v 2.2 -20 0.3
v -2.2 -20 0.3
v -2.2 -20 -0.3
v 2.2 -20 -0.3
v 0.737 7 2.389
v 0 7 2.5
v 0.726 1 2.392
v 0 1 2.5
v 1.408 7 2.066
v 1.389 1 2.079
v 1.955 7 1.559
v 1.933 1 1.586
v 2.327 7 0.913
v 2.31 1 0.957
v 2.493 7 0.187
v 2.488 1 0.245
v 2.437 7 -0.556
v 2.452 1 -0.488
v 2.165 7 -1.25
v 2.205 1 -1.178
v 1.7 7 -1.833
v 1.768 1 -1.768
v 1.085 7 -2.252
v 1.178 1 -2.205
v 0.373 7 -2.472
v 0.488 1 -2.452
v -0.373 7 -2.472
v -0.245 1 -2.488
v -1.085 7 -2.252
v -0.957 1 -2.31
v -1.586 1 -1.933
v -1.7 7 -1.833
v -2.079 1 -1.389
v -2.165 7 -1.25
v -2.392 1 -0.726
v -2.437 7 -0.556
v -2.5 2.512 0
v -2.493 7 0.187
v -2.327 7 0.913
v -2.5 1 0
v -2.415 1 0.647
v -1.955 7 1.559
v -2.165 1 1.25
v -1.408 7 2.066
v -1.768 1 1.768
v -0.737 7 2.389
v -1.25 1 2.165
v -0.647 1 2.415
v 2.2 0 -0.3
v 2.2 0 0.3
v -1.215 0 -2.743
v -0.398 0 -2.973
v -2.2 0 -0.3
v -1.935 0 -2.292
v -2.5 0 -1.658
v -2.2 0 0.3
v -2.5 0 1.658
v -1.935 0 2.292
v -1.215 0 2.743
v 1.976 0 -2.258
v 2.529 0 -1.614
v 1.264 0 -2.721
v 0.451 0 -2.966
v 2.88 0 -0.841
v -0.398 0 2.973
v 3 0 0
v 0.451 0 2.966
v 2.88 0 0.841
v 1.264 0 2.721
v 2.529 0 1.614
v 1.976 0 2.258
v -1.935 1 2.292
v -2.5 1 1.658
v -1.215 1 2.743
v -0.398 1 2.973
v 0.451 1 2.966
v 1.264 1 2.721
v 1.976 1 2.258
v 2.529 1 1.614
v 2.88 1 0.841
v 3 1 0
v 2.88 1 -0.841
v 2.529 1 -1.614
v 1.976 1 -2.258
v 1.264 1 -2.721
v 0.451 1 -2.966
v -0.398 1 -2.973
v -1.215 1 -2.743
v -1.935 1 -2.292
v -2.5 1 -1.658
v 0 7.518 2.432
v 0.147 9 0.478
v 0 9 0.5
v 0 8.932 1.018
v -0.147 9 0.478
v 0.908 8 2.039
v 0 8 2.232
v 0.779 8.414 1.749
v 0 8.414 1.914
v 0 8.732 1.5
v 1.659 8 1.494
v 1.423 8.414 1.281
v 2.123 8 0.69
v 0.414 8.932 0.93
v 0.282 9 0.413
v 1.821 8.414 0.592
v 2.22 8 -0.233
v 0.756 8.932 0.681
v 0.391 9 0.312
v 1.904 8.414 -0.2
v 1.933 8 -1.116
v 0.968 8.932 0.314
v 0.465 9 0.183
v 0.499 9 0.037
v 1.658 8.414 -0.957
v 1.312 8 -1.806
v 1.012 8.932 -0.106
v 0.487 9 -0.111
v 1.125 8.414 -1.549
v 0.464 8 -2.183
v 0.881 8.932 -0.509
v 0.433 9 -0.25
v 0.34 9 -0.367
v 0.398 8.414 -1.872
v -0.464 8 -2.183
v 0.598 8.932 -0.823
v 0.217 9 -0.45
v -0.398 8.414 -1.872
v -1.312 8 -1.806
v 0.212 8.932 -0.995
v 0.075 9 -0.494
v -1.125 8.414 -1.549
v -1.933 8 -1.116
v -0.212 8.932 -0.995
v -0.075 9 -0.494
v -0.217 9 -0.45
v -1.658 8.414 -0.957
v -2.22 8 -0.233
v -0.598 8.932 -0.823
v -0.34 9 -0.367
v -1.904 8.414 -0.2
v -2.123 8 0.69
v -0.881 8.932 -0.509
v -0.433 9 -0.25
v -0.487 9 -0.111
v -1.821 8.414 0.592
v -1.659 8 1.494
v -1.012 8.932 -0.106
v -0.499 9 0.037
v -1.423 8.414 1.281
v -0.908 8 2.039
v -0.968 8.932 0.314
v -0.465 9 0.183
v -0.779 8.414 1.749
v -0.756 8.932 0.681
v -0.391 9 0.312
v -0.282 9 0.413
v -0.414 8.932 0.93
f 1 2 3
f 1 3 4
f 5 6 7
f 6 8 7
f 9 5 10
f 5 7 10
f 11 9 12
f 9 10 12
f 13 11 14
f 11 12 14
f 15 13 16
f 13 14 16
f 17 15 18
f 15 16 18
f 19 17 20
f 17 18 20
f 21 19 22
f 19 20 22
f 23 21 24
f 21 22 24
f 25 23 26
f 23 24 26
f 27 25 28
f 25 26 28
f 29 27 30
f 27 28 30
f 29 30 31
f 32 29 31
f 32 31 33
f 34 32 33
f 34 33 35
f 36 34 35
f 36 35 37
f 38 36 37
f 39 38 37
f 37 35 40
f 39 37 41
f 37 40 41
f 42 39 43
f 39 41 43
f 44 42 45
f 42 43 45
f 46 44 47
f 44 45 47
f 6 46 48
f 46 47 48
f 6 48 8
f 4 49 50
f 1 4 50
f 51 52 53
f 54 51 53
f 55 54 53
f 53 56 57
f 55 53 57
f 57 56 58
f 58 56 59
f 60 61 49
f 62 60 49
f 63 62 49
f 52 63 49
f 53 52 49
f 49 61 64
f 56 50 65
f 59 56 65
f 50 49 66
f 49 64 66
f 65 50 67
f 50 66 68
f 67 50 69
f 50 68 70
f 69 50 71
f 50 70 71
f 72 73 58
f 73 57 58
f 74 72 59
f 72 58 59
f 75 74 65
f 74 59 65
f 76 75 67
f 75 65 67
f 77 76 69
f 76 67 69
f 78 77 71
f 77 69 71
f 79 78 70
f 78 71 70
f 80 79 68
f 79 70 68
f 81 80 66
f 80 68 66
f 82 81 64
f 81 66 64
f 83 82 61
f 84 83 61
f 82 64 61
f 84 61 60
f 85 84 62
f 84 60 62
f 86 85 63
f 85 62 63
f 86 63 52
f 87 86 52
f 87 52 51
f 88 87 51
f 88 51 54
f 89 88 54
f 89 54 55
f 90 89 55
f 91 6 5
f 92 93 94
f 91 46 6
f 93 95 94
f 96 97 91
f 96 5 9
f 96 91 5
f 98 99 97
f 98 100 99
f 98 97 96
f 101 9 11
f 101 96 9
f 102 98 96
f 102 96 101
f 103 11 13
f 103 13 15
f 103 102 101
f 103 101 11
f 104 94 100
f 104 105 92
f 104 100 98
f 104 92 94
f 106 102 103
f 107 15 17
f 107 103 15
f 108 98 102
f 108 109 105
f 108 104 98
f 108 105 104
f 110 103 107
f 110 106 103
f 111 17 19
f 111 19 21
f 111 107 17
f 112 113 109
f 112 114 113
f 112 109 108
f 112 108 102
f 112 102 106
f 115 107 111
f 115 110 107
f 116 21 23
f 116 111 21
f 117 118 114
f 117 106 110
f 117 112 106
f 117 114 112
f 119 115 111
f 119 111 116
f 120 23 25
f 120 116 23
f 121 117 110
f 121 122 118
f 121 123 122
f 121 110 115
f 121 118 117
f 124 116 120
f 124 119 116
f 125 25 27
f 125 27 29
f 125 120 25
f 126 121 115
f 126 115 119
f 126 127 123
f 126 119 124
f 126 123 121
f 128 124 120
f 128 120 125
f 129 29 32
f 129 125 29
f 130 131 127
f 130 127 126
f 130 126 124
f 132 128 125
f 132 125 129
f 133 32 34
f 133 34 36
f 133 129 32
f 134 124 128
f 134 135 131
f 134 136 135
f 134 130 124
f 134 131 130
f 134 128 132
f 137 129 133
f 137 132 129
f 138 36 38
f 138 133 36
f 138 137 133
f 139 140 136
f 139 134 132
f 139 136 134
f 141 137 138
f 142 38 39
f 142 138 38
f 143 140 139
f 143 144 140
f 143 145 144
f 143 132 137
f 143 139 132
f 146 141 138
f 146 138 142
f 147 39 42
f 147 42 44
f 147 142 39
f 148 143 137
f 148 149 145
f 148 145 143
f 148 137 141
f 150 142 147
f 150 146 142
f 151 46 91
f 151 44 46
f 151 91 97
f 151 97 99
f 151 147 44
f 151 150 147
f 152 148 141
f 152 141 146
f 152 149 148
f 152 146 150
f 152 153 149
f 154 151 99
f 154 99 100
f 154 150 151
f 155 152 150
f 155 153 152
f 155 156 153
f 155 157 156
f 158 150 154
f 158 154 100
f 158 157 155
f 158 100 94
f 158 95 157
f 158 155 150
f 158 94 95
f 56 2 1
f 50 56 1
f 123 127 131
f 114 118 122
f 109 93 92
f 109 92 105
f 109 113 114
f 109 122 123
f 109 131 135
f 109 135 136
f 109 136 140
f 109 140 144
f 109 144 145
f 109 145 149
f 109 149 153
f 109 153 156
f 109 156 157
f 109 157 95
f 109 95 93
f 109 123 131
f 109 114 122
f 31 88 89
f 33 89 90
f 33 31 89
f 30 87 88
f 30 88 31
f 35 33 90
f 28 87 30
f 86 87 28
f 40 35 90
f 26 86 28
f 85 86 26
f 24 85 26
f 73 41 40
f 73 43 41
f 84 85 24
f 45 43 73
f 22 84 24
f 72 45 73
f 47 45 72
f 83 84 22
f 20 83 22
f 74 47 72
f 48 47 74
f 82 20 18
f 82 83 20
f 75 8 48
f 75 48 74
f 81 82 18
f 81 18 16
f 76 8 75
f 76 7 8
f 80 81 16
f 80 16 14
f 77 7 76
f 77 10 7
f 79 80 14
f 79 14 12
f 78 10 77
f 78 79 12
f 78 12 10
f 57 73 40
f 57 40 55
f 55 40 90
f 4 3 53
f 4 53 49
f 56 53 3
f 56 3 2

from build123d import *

# Parameters (mm, degrees)
SKETCH1_R           = 3
BOSS_EXTRUDE1_DEPTH = 1
SKETCH2_R           = 2.5
BOSS_EXTRUDE2_DEPTH = 8
FILLET1_R           = 2
SKETCH3_W           = 4.4
SKETCH3_H           = 0.6
BOSS_EXTRUDE3_DEPTH = 20
CUT_EXTRUDE1_START  = -2.5
SKETCH4_W           = 14.899802266
SKETCH4_H           = 5.02411501
CUT_EXTRUDE1_DEPTH  = 20


with BuildPart() as part:
    # Sketch1 → Boss-Extrude1 (new body)
    with BuildSketch(Plane(origin=(0, 0, 0), x_dir=(1, 0, 0), z_dir=(0, 1, 0))):
        with Locations(Location((0, 0, 0), (0, 0, 270))):
            Circle(SKETCH1_R)
    extrude(amount=BOSS_EXTRUDE1_DEPTH)

    # Sketch2 → Boss-Extrude2 (add)
    with BuildSketch(Plane(origin=(0, 1, 0), x_dir=(1, 0, 0), z_dir=(0, 1, 0))):
        with Locations(Location((0, 0, 0), (0, 0, 270))):
            Circle(SKETCH2_R)
    extrude(amount=BOSS_EXTRUDE2_DEPTH)

    # Fillet1
    fillet1_edges = [part.edges().sort_by_distance(p)[0] for p in [
        (0, 9, -2.5),
    ]]
    fillet(fillet1_edges, radius=FILLET1_R)

    # Sketch3 → Boss-Extrude3 (add)
    with BuildSketch(Plane.XZ):
        Rectangle(SKETCH3_W, SKETCH3_H)
    extrude(amount=BOSS_EXTRUDE3_DEPTH)

    # Sketch4 → Cut-Extrude1 (cut)
    with BuildSketch(Plane(origin=(0, 0, 0), x_dir=(0, 0, -1), z_dir=(1, 0, 0)).offset(CUT_EXTRUDE1_START)):
        Rectangle(SKETCH4_W, SKETCH4_H)
    extrude(amount=-CUT_EXTRUDE1_DEPTH, mode=Mode.SUBTRACT)


solid = part.part
